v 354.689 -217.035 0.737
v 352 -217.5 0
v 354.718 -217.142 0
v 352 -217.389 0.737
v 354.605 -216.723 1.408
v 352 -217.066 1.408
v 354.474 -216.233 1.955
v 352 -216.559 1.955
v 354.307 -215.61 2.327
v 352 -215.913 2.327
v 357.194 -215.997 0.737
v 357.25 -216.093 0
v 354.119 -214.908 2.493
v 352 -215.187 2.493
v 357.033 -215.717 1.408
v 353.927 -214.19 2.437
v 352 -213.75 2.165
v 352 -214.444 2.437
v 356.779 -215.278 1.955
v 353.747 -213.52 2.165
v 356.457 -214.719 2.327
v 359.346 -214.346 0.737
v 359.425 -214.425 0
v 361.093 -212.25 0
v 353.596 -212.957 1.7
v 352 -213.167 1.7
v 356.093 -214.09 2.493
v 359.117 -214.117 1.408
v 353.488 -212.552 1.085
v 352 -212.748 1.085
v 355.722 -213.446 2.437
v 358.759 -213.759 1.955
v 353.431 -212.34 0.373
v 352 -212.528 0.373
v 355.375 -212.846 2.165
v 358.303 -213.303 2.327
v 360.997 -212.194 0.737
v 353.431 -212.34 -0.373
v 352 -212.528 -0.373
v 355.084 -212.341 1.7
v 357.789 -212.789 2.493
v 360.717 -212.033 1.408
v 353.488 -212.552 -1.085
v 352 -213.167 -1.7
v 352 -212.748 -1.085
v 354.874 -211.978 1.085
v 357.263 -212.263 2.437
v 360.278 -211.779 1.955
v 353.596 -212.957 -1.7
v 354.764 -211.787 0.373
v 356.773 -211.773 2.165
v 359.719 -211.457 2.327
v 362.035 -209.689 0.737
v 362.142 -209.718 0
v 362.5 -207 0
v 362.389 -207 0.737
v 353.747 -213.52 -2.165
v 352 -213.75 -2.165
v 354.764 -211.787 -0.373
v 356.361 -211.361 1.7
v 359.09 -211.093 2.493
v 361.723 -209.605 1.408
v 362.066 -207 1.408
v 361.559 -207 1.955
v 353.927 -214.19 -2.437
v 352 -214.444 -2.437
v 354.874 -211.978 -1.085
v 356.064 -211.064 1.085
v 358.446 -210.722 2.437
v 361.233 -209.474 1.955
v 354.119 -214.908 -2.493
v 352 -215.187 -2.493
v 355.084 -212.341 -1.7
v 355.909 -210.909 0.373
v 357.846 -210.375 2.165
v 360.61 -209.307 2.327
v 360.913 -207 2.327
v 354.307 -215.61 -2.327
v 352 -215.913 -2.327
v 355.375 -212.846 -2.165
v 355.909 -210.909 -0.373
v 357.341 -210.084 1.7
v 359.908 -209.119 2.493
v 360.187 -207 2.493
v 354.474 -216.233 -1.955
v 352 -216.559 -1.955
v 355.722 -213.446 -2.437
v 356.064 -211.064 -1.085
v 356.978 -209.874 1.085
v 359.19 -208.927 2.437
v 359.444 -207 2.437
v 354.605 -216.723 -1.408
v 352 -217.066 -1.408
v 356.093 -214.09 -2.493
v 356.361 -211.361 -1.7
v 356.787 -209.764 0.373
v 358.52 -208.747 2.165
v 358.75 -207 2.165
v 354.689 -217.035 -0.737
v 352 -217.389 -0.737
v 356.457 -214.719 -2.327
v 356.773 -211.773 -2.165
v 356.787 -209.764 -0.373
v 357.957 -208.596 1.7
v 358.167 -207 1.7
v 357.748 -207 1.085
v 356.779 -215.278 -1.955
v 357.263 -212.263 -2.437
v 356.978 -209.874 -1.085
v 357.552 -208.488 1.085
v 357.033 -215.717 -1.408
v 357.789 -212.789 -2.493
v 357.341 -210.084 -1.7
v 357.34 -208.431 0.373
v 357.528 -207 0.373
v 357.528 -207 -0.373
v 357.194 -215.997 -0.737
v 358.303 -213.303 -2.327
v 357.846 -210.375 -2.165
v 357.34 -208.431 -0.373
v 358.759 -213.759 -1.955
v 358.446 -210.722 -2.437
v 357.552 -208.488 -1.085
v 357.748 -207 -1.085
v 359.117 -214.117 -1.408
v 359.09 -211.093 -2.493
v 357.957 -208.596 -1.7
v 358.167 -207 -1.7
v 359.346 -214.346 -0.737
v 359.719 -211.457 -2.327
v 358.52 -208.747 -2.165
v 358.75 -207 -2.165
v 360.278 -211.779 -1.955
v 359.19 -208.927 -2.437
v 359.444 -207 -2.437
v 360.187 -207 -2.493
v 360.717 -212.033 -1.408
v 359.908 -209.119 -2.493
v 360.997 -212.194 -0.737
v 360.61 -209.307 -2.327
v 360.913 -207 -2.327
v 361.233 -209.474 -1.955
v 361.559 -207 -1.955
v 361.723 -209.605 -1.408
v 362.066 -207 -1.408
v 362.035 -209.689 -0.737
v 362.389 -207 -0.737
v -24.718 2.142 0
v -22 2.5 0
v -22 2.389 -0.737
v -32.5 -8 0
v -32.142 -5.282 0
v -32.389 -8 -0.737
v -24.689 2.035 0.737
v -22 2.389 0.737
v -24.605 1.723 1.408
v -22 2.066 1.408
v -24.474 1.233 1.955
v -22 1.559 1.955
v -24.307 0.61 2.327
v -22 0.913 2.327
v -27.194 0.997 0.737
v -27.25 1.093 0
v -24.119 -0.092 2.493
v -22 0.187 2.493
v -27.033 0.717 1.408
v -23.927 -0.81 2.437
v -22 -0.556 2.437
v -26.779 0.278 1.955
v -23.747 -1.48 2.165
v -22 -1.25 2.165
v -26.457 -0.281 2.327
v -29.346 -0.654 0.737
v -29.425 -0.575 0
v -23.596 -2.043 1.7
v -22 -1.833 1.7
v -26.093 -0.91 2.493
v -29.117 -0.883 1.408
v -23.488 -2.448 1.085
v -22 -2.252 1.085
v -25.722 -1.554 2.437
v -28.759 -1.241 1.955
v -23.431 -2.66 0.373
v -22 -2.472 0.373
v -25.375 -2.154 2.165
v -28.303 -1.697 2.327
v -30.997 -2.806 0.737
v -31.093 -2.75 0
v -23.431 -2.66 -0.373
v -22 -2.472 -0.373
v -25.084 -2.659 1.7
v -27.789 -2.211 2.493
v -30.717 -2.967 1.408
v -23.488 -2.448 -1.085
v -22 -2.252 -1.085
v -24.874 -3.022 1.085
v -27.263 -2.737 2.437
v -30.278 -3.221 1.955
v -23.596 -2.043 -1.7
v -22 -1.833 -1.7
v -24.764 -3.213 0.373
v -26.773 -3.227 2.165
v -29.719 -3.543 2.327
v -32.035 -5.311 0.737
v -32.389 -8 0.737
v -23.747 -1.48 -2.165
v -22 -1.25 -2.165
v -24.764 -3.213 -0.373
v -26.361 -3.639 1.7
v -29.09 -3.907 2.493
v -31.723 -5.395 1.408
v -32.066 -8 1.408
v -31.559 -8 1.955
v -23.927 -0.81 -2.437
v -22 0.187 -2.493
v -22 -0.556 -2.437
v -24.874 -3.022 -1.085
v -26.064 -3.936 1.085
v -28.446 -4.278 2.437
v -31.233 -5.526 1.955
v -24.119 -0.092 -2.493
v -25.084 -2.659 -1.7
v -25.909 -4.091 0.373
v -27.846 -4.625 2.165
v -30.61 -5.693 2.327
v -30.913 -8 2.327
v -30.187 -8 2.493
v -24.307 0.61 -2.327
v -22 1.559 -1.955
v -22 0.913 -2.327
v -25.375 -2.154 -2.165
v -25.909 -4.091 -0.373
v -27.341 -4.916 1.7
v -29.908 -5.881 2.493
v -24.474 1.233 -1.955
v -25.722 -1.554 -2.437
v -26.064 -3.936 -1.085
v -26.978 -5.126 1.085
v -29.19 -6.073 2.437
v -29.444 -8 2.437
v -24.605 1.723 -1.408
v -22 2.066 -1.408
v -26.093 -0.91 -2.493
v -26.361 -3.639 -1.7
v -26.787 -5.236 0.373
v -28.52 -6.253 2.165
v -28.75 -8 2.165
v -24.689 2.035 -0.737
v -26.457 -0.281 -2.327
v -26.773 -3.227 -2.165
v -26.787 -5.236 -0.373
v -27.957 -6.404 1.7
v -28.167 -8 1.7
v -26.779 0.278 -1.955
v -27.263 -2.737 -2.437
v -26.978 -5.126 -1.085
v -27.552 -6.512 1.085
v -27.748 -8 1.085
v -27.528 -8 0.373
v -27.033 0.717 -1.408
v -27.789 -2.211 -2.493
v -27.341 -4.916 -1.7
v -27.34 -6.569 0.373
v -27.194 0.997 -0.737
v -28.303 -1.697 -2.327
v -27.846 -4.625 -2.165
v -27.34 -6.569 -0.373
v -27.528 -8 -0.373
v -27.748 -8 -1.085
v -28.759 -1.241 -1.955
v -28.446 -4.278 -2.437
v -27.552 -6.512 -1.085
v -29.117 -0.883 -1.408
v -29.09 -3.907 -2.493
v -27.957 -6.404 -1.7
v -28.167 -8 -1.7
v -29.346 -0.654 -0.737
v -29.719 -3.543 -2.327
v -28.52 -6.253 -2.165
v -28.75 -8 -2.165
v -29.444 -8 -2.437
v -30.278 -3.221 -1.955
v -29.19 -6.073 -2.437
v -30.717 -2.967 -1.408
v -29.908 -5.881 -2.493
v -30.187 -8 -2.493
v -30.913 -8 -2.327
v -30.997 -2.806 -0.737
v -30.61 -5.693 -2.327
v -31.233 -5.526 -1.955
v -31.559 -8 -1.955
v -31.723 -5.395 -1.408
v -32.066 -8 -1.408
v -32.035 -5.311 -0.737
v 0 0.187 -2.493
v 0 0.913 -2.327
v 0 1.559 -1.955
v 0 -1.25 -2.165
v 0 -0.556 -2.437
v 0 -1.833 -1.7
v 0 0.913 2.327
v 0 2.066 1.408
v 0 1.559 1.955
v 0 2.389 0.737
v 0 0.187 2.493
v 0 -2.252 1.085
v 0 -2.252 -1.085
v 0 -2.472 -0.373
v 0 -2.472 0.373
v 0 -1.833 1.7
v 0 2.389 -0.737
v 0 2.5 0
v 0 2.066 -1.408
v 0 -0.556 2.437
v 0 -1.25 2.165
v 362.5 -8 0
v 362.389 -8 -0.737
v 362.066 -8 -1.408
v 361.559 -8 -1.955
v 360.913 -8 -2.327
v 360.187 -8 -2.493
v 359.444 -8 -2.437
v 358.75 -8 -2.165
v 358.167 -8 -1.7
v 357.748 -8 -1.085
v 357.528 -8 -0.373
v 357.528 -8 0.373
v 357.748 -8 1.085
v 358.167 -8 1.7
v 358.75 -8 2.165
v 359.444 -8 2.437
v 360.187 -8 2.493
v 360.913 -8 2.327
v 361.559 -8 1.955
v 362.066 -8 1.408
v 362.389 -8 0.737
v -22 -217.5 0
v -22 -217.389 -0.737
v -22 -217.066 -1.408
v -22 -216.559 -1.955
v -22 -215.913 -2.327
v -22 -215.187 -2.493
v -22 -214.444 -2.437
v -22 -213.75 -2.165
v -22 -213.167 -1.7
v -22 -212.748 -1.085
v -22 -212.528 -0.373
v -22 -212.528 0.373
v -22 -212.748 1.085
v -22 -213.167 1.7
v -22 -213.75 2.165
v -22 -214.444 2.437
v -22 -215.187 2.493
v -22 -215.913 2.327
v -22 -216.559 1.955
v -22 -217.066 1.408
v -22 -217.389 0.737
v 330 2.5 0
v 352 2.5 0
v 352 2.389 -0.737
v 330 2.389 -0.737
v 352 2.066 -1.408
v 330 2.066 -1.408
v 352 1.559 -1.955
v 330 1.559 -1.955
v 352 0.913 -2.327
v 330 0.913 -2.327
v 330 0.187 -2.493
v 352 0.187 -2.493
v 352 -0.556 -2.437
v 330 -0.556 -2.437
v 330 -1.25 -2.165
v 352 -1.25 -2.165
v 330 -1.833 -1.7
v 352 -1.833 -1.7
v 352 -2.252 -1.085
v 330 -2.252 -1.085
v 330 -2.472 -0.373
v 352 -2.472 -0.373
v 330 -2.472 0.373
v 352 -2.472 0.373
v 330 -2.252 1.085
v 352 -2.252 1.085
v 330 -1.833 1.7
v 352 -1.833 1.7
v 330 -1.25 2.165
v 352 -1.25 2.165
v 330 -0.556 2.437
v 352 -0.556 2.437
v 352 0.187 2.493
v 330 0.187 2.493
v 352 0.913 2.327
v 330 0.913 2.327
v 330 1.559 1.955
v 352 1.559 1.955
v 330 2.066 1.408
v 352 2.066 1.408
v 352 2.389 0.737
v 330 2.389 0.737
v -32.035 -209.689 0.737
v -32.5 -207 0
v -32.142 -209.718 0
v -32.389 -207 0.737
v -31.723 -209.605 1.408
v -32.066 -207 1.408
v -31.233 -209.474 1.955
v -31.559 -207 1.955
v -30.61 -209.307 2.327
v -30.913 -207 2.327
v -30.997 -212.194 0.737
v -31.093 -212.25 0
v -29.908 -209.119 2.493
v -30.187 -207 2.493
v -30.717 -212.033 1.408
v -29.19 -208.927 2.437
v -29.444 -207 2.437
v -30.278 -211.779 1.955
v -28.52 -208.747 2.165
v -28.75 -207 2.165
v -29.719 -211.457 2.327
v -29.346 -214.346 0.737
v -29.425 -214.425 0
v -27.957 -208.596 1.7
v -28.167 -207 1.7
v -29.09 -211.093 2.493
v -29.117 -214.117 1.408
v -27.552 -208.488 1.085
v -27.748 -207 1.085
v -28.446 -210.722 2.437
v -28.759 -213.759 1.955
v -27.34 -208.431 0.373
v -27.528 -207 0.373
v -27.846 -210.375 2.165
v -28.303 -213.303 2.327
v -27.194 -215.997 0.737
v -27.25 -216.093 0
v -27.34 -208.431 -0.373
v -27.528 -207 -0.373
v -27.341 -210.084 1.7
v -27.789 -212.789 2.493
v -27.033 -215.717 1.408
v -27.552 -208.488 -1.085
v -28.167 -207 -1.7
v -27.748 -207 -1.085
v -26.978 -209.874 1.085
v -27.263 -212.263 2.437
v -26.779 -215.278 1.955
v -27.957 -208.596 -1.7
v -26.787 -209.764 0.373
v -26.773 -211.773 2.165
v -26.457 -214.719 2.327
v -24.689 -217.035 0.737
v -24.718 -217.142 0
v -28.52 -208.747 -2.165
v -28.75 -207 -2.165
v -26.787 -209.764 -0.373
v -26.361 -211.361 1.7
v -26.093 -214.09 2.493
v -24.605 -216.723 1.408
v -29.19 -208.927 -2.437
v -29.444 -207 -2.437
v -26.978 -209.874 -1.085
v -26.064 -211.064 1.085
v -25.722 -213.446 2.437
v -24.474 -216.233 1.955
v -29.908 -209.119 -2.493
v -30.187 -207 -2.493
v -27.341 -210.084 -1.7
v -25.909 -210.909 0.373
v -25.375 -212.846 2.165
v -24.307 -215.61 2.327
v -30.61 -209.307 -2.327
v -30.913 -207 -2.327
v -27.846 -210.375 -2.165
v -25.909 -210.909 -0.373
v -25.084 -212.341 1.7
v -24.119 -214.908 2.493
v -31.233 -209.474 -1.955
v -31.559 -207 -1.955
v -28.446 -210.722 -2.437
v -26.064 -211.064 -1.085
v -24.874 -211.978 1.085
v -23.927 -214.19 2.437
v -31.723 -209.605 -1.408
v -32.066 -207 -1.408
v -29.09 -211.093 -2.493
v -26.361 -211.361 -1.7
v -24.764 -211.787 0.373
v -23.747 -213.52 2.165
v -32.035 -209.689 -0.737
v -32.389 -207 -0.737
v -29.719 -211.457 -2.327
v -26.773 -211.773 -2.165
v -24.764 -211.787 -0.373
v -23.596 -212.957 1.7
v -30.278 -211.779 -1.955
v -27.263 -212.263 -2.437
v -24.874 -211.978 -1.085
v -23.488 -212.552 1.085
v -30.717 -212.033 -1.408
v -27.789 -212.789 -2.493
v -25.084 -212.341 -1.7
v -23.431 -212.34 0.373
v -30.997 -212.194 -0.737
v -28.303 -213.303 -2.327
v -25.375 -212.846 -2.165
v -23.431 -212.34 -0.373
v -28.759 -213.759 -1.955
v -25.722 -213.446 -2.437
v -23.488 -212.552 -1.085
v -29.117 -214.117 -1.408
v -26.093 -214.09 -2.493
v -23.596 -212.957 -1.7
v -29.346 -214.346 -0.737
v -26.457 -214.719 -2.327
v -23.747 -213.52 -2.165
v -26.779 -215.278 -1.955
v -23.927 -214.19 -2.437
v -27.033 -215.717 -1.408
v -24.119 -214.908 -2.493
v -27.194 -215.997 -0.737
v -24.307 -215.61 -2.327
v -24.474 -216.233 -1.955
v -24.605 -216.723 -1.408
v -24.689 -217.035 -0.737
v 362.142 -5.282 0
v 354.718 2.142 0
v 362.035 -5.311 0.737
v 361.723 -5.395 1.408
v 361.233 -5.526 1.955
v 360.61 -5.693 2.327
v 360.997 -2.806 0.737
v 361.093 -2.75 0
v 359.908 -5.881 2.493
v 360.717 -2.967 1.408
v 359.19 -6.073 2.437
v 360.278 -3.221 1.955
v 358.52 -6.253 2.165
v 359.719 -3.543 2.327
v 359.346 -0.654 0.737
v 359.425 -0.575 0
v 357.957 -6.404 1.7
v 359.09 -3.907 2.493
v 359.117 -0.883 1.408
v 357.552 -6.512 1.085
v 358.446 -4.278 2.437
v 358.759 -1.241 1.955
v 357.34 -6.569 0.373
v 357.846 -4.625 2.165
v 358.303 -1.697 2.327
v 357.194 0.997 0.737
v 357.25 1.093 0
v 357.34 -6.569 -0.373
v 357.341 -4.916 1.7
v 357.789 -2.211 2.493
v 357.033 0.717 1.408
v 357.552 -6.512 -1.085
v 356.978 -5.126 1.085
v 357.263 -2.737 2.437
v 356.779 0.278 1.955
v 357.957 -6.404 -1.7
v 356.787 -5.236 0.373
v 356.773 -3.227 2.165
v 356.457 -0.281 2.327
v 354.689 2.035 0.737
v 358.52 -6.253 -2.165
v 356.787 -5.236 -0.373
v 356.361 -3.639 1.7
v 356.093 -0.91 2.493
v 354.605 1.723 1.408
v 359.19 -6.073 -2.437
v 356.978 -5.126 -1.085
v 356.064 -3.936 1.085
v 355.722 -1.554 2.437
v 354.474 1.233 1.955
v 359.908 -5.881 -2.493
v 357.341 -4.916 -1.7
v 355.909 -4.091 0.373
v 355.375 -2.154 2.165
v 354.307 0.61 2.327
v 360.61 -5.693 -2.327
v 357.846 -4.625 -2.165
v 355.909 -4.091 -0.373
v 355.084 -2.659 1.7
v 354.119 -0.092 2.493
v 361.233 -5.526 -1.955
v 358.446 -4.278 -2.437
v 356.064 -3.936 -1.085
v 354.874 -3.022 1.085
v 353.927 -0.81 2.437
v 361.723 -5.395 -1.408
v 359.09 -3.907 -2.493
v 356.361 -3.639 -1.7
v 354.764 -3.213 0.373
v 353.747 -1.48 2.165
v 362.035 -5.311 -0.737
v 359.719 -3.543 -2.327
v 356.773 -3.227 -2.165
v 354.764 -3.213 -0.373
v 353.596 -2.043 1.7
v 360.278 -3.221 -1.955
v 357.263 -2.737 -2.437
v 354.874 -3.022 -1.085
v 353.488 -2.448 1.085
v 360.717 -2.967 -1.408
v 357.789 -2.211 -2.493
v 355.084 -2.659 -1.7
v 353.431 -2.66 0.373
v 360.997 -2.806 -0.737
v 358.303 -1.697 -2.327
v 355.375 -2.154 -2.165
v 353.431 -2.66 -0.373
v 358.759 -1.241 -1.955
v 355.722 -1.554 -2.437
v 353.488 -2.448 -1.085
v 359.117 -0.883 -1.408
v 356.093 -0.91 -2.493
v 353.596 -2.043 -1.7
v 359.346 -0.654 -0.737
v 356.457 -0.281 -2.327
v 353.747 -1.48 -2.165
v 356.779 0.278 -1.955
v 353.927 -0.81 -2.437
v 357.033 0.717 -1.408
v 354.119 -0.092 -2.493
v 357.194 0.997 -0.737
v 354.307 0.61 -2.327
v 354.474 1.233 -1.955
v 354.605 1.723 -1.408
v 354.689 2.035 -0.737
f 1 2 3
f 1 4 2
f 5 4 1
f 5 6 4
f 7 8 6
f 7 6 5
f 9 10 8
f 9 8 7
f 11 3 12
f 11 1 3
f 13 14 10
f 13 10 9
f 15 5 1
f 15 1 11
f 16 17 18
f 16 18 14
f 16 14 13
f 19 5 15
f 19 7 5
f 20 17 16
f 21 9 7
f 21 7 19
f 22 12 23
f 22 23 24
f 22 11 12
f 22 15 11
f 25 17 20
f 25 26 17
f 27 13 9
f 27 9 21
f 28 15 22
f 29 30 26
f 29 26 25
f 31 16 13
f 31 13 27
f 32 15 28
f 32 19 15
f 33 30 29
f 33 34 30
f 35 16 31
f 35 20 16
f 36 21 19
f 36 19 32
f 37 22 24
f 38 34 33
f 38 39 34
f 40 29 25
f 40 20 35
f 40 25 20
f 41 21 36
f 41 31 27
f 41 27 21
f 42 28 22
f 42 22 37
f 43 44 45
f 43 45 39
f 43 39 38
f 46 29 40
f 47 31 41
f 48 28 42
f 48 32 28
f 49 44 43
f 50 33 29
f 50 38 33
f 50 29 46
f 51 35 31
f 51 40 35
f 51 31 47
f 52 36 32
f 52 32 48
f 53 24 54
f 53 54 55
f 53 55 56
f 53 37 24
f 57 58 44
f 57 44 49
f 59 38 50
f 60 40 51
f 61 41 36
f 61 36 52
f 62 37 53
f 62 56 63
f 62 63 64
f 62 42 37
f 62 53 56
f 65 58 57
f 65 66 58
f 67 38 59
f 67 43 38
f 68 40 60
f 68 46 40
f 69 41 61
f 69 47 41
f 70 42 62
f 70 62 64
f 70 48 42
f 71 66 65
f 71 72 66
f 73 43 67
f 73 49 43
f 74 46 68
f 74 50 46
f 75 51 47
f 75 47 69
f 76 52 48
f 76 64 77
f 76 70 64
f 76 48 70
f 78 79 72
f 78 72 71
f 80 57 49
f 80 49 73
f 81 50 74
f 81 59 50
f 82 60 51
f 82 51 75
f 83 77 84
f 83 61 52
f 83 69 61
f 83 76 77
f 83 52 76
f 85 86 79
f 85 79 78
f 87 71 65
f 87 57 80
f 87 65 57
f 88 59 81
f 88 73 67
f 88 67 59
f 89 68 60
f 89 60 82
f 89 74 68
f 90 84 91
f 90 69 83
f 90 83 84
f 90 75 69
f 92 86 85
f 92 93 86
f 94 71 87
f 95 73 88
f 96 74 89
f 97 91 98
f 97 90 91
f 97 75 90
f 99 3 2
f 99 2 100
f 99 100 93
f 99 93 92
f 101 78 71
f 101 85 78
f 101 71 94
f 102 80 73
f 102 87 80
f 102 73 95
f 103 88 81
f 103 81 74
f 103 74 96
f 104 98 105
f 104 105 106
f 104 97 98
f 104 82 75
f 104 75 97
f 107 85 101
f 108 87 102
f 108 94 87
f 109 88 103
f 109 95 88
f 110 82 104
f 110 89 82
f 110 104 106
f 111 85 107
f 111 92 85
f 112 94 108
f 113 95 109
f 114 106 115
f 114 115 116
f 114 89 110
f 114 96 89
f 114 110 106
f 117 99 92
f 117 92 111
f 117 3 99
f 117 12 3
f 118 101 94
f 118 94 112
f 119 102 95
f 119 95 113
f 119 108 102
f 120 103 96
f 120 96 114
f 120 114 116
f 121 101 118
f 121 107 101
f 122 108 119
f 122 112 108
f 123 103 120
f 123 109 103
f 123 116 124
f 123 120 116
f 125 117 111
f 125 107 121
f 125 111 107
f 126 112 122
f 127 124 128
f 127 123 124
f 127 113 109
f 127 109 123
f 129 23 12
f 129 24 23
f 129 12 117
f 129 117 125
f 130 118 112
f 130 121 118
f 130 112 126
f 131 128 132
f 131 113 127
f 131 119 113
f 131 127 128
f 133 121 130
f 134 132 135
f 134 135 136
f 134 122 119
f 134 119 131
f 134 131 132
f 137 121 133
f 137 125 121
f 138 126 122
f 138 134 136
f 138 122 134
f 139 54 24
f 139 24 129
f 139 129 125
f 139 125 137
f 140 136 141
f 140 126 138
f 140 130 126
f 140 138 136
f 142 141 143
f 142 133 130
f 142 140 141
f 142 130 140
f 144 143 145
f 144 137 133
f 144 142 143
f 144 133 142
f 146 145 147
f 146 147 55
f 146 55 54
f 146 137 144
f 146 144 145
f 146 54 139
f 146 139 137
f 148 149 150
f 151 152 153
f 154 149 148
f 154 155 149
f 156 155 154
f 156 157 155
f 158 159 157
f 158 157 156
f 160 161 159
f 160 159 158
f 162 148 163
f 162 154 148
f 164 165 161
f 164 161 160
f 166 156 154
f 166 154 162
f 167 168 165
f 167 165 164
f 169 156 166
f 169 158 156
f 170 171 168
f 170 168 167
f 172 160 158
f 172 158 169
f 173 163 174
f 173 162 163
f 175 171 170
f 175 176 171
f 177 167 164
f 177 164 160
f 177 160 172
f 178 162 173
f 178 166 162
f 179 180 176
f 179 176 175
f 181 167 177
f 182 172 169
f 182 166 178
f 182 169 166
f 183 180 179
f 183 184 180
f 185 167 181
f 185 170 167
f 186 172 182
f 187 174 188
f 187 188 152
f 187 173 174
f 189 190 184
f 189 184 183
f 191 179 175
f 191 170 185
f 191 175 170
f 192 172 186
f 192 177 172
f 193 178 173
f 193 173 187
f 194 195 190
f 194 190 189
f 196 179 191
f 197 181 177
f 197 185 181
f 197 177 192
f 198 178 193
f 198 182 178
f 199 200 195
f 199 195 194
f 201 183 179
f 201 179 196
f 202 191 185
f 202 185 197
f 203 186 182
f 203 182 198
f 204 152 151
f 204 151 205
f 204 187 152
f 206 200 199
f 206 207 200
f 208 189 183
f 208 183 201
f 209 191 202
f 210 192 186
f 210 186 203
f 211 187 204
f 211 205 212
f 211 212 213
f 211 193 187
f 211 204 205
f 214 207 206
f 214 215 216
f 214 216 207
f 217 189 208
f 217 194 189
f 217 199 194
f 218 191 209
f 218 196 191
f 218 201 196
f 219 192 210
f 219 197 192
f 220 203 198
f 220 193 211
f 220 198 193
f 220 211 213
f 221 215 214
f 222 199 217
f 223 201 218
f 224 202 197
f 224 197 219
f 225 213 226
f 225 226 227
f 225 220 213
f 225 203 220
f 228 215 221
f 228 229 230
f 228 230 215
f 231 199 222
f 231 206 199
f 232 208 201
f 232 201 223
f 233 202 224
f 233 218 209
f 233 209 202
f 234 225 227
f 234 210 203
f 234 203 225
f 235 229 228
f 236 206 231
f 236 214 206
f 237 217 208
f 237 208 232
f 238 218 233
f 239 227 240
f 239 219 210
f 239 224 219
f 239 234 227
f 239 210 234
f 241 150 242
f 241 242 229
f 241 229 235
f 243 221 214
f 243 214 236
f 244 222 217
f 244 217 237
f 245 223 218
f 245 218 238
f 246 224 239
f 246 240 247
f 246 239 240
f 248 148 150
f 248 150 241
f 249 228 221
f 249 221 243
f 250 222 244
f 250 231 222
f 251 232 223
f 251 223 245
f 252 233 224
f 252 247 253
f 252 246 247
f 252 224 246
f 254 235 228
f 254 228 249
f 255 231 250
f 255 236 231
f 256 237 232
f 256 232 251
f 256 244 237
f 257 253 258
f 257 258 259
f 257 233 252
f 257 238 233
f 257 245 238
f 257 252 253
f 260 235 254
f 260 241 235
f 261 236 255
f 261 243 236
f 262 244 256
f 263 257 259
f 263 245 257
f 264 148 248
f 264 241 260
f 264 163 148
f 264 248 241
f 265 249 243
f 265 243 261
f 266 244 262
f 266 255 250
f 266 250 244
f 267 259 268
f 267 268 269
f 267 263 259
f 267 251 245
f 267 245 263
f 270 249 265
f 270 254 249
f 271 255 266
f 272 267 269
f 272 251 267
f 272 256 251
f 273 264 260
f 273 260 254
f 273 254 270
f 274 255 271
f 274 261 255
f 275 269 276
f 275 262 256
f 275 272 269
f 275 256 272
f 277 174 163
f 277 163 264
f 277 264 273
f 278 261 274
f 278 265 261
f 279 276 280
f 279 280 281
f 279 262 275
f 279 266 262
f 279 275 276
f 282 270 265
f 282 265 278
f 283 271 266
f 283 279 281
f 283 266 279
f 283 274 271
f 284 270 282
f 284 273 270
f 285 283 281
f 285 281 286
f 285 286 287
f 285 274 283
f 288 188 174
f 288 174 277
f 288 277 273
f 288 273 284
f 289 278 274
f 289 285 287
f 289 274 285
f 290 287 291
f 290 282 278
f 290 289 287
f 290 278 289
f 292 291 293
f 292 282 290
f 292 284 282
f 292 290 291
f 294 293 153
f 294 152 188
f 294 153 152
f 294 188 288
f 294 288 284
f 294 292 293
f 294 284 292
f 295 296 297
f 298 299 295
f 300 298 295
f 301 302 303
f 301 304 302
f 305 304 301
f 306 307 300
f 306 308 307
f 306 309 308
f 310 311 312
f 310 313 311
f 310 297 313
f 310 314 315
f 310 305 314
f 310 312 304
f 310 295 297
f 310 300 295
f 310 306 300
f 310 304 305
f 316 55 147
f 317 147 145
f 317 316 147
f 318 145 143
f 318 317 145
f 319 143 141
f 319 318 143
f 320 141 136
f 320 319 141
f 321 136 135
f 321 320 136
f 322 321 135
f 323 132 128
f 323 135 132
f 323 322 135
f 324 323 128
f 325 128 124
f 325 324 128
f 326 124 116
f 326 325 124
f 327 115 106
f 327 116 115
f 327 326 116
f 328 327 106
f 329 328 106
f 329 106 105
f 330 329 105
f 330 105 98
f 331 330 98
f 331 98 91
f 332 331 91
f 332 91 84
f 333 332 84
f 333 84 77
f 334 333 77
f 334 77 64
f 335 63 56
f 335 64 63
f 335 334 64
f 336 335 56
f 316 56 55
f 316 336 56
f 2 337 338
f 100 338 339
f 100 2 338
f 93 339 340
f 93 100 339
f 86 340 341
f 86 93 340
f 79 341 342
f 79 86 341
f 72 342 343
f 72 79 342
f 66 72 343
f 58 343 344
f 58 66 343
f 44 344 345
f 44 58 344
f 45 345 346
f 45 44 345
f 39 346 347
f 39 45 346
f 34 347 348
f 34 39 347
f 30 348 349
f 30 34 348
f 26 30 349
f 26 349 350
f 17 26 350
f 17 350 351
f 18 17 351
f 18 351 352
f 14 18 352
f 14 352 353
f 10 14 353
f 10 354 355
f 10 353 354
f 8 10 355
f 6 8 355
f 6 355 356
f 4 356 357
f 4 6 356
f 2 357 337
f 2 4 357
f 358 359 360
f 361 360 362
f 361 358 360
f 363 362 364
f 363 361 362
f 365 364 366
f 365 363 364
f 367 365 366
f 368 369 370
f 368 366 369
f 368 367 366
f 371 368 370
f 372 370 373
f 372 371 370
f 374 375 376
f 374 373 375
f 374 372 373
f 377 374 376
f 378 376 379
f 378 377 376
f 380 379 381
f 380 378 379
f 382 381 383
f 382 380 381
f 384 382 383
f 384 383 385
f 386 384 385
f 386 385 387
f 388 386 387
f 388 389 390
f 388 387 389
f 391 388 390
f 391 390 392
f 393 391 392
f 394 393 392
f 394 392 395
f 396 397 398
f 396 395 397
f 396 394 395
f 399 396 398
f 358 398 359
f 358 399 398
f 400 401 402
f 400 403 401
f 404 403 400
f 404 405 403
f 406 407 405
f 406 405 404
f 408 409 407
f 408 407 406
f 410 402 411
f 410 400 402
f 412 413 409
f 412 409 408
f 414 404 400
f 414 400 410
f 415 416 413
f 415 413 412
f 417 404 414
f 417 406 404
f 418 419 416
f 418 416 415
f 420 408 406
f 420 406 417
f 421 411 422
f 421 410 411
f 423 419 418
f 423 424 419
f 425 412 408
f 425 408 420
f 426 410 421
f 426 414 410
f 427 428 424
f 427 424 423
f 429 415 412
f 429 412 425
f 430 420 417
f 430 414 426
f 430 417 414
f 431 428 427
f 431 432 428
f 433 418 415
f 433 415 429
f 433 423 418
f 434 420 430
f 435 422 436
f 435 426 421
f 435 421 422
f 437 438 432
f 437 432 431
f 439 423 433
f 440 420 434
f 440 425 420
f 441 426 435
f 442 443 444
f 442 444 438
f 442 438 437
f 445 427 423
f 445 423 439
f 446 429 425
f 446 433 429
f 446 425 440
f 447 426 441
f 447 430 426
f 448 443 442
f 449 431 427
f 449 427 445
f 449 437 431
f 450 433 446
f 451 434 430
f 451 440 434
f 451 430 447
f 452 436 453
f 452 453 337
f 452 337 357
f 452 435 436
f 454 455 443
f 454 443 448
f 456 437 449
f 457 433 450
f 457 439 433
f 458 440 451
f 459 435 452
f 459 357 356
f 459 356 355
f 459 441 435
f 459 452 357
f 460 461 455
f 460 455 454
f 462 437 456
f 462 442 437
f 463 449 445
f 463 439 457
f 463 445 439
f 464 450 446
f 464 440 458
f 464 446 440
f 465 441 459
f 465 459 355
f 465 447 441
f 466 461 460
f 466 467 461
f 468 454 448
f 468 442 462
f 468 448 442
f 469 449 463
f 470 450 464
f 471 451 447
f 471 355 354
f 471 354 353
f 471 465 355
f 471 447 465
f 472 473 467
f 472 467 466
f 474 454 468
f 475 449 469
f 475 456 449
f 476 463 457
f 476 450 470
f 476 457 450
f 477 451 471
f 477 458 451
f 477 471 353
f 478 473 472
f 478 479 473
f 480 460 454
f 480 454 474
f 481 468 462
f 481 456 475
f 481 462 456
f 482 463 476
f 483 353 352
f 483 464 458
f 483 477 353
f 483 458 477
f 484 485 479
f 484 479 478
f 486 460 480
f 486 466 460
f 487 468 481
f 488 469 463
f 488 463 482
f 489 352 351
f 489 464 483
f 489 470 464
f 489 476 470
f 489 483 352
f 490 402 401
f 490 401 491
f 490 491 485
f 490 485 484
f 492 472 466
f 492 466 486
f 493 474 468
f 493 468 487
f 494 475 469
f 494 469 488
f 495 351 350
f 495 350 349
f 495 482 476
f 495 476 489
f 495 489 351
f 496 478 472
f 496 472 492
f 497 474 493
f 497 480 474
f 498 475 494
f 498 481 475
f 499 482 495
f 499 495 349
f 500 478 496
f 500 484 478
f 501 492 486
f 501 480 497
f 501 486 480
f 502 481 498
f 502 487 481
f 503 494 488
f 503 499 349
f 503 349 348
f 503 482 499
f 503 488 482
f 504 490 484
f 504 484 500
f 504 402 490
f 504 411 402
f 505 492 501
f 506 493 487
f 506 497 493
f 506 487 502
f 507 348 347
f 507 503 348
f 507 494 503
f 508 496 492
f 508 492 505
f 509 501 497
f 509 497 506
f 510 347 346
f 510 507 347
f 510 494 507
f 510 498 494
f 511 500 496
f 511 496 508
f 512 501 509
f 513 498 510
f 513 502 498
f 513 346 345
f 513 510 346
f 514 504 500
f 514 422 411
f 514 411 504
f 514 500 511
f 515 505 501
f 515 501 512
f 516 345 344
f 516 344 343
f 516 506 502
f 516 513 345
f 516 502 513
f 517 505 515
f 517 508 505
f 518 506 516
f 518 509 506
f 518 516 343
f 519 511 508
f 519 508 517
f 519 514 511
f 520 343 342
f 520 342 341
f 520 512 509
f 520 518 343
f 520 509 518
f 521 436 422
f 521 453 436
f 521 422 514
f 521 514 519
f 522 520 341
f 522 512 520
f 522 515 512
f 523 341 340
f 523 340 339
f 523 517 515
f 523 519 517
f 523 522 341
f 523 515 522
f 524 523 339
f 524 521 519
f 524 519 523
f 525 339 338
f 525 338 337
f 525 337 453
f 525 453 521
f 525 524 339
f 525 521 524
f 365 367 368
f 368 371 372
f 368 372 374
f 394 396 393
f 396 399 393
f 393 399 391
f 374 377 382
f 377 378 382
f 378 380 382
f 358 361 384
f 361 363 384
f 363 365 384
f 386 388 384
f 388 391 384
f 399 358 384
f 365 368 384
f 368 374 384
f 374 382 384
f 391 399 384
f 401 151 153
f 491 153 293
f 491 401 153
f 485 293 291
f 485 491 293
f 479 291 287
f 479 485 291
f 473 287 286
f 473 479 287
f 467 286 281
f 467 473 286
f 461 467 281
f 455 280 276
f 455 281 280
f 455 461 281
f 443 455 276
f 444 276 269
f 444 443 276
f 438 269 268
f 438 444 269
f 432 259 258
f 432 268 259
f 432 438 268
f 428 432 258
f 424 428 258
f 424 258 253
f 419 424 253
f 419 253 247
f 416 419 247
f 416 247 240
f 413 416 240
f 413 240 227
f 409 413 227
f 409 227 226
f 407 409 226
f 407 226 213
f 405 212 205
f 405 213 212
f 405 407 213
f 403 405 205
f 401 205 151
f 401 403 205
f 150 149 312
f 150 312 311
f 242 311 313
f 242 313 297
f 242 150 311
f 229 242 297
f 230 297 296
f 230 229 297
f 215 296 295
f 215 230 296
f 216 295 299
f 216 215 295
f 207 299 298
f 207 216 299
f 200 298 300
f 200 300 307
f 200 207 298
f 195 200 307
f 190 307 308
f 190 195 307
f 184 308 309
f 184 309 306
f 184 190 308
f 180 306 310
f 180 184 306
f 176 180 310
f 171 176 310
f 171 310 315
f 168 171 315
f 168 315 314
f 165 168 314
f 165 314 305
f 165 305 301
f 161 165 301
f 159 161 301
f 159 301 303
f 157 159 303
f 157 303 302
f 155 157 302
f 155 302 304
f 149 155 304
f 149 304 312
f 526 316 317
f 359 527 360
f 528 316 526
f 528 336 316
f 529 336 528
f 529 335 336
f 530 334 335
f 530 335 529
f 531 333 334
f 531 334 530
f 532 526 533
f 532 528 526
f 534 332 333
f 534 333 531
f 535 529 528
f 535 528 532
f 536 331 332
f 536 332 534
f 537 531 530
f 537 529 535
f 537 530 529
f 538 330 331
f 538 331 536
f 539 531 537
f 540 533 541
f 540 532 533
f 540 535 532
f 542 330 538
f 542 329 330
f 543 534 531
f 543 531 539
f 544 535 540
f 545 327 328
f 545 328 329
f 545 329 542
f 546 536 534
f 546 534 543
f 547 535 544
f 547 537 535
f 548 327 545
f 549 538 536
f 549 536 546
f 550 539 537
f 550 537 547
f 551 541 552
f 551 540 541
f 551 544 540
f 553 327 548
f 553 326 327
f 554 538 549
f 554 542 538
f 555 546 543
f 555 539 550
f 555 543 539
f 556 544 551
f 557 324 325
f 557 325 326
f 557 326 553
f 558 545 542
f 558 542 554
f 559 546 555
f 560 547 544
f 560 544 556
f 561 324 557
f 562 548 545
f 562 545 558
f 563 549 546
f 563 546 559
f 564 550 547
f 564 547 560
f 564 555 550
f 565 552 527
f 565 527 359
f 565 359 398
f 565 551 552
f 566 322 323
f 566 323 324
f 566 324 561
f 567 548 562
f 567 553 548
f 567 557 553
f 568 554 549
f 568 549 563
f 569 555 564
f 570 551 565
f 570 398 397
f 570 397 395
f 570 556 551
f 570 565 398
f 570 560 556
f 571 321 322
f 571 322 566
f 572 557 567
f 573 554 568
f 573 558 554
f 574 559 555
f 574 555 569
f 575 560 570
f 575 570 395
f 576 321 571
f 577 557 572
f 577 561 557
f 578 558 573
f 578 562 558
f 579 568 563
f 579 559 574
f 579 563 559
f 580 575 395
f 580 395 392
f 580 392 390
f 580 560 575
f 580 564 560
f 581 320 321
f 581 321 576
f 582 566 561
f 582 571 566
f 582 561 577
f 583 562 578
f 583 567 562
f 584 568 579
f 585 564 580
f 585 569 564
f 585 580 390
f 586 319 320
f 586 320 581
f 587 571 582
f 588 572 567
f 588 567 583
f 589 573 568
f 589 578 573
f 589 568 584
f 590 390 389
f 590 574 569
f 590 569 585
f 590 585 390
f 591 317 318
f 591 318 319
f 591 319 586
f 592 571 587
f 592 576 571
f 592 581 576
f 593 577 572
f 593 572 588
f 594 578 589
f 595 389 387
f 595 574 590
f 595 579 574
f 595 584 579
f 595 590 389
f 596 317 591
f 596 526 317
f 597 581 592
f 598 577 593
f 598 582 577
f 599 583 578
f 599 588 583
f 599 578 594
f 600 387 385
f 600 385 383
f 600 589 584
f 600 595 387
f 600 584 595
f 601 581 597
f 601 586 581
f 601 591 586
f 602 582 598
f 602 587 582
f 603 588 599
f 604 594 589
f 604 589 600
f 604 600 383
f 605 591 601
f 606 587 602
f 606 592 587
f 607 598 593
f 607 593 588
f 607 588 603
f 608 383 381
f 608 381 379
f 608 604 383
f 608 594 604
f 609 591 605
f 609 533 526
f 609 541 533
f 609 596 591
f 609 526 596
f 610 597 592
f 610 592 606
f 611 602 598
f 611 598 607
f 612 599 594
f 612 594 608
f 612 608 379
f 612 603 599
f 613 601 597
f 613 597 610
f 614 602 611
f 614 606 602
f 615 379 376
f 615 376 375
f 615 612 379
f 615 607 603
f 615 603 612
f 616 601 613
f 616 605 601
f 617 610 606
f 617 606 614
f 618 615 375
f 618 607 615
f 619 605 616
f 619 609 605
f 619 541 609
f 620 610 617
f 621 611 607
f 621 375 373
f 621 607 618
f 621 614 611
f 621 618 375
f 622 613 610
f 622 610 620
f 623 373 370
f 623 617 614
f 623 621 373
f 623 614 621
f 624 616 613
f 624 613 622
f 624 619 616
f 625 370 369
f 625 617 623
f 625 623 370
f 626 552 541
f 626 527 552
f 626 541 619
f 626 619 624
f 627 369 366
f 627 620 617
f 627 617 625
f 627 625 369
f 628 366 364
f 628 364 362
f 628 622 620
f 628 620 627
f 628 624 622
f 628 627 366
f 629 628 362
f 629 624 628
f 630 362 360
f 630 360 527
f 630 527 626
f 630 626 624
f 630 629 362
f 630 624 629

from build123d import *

# Parameters (mm, degrees)
F1_R = 2.5


with BuildPart() as f2:
    # F2: sweep along a path in F0
    with BuildLine(Plane.XY) as f2_path:
        Line((0, 0), (-22, 0))
        ThreePointArc((-22, 0), (-27.6568542495, -2.3431457505), (-30, -8))
        Line((-30, -8), (-30, -207))
        ThreePointArc((-30, -207), (-27.6568542495, -212.6568542495), (-22, -215))
        Line((-22, -215), (352, -215))
        ThreePointArc((352, -215), (357.6568542495, -212.6568542495), (360, -207))
        Line((360, -207), (360, -8))
        ThreePointArc((360, -8), (357.6568542495, -2.3431457505), (352, 0))
        Line((352, 0), (330, 0))
    # F1 (on Right) → F2 (sweep)
    with BuildSketch(Plane.YZ):
        Circle(F1_R)
    sweep(path=f2_path.line)


solid = f2.part
